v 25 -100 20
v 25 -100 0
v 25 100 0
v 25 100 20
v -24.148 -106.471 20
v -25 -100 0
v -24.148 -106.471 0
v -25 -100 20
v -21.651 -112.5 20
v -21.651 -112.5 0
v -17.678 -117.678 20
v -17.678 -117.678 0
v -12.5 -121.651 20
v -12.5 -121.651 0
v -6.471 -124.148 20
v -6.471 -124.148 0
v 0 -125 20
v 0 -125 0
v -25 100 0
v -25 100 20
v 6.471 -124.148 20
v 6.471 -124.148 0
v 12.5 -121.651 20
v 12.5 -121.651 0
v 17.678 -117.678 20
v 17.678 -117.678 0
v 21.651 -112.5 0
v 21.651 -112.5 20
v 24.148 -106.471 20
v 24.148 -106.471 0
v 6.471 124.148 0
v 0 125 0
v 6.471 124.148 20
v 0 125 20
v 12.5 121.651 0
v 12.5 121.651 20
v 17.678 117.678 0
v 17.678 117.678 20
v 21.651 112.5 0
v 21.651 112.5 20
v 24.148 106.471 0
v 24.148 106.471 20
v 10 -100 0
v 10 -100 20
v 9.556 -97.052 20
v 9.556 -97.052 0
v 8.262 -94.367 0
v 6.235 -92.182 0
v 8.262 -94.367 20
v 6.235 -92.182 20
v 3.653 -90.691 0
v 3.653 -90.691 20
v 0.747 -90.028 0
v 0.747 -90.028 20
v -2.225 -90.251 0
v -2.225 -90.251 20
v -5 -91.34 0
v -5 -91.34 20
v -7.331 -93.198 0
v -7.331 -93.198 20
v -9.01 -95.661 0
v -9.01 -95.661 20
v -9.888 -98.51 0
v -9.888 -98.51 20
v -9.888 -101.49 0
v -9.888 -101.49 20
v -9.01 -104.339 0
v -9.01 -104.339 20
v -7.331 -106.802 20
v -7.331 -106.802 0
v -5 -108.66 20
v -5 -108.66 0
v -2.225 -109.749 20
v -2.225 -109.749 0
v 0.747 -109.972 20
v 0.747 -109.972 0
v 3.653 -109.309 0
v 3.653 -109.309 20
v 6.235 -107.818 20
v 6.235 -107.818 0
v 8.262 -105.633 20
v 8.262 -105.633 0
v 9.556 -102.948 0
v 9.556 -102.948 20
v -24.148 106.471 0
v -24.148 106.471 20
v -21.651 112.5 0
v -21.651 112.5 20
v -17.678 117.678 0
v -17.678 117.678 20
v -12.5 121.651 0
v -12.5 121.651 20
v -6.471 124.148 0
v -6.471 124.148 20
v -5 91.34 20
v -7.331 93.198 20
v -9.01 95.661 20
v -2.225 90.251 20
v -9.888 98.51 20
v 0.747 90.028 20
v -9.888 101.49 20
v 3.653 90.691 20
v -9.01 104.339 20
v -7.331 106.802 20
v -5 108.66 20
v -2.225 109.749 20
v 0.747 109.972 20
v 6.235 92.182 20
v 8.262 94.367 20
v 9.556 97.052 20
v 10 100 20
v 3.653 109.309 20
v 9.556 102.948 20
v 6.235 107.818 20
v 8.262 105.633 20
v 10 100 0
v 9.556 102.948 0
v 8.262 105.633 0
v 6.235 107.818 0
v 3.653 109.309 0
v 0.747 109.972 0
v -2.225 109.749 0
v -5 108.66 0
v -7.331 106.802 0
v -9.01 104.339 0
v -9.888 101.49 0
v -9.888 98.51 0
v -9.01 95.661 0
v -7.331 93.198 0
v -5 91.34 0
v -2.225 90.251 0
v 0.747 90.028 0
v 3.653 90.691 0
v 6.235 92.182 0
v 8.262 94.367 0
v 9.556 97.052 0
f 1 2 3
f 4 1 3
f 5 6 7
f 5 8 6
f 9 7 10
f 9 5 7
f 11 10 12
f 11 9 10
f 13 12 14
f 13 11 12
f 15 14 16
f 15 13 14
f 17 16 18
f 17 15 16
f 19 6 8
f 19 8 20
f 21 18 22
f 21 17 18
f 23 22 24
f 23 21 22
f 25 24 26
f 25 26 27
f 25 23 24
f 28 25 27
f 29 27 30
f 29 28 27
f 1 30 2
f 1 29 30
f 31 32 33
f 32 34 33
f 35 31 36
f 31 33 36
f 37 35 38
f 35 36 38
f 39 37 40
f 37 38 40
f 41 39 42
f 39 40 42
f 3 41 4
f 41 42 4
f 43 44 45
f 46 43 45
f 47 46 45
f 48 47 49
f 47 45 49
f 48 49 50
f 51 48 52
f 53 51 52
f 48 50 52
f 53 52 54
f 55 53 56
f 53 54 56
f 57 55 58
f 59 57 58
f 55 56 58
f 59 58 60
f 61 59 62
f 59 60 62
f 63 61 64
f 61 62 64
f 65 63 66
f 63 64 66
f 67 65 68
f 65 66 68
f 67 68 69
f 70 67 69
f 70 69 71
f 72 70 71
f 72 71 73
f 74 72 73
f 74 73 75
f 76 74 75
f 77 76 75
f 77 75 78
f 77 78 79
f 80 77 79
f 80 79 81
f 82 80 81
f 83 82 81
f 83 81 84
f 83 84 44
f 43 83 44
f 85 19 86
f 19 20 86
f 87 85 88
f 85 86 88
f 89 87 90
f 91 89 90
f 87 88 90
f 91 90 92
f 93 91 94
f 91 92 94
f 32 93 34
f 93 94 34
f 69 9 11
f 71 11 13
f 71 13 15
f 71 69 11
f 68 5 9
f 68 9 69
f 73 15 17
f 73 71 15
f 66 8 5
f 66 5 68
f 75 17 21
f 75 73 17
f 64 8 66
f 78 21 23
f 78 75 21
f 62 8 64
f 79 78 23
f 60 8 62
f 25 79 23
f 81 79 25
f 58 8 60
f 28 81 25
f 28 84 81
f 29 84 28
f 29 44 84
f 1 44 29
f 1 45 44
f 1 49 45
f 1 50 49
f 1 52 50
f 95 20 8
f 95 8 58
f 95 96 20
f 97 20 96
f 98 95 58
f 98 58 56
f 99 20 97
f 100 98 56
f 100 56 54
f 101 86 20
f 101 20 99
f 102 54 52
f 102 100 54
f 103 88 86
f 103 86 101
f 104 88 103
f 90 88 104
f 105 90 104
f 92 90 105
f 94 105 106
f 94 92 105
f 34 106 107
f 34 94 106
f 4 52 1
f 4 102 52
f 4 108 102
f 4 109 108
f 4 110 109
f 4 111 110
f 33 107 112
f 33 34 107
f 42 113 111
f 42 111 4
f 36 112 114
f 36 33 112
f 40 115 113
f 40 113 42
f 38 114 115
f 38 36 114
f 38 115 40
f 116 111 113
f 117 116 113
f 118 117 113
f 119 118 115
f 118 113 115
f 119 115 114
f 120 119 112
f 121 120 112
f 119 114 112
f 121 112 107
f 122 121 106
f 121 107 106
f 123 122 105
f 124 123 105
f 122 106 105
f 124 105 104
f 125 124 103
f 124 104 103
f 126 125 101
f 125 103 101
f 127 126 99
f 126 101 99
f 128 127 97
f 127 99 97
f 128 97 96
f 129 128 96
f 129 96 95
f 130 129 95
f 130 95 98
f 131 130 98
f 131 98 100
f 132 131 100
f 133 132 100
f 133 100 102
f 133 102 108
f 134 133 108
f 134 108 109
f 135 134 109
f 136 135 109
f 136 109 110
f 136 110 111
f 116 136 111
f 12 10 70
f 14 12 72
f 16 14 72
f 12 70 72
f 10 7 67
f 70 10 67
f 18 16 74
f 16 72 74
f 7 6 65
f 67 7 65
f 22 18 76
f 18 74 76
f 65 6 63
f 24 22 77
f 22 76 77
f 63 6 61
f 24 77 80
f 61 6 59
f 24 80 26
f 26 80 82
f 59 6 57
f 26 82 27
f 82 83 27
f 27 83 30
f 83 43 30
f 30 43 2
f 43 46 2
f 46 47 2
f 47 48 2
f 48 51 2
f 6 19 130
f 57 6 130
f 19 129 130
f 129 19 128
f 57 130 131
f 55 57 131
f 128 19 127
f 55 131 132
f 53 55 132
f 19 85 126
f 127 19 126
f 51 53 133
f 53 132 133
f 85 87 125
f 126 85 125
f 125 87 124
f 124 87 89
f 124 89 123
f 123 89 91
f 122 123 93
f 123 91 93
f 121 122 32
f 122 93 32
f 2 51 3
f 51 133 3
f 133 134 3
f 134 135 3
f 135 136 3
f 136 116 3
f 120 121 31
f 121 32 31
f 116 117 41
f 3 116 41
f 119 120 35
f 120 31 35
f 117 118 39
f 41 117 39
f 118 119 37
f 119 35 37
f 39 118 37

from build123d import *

# Parameters (mm, degrees)
ESQUISSE1_W             = 50
ESQUISSE1_H             = 250
BOSS_EXTRU_1_DEPTH      = 20
ENL_V_MAT_EXTRU_1_REACH = 131.035
ESQUISSE2_R             = 10
CONG_1_R                = 25


with BuildPart() as part:
    # Esquisse1 → Boss.-Extru.1 (new body)
    with BuildSketch(Plane.XY):
        Rectangle(ESQUISSE1_W, ESQUISSE1_H)
    extrude(amount=BOSS_EXTRU_1_DEPTH)

    # Esquisse2 → Enlèv. mat.-Extru.1 (cut, up to next)
    with BuildSketch(Plane.XY.offset(20), mode=Mode.PRIVATE) as enl_v_mat_extru_1_sk1:
        with Locations((0, -100)):
            Circle(ESQUISSE2_R)
    enl_v_mat_extru_1_tool1 = extrude(enl_v_mat_extru_1_sk1.sketch, amount=-ENL_V_MAT_EXTRU_1_REACH, mode=Mode.PRIVATE) & part.part
    # Esquisse2 → Enlèv. mat.-Extru.1 (cut, up to next)
    with BuildSketch(Plane.XY.offset(20), mode=Mode.PRIVATE) as enl_v_mat_extru_1_sk2:
        with Locations((0, 100)):
            Circle(ESQUISSE2_R)
    enl_v_mat_extru_1_tool2 = extrude(enl_v_mat_extru_1_sk2.sketch, amount=-ENL_V_MAT_EXTRU_1_REACH, mode=Mode.PRIVATE) & part.part
    add(enl_v_mat_extru_1_tool1.solids().sort_by_distance((0, -100, 20))[0], mode=Mode.SUBTRACT)
    add(enl_v_mat_extru_1_tool2.solids().sort_by_distance((0, 100, 20))[0], mode=Mode.SUBTRACT)

    # Congé1
    cong_1_edges = [part.edges().sort_by_distance(p)[0] for p in [
        (-25, -125, 10),
        (25, -125, 10),
        (-25, 125, 10),
        (25, 125, 10),
    ]]
    fillet(cong_1_edges, radius=CONG_1_R - 0.0001)  # a hair under: the kernel refuses the full size


solid = part.part
